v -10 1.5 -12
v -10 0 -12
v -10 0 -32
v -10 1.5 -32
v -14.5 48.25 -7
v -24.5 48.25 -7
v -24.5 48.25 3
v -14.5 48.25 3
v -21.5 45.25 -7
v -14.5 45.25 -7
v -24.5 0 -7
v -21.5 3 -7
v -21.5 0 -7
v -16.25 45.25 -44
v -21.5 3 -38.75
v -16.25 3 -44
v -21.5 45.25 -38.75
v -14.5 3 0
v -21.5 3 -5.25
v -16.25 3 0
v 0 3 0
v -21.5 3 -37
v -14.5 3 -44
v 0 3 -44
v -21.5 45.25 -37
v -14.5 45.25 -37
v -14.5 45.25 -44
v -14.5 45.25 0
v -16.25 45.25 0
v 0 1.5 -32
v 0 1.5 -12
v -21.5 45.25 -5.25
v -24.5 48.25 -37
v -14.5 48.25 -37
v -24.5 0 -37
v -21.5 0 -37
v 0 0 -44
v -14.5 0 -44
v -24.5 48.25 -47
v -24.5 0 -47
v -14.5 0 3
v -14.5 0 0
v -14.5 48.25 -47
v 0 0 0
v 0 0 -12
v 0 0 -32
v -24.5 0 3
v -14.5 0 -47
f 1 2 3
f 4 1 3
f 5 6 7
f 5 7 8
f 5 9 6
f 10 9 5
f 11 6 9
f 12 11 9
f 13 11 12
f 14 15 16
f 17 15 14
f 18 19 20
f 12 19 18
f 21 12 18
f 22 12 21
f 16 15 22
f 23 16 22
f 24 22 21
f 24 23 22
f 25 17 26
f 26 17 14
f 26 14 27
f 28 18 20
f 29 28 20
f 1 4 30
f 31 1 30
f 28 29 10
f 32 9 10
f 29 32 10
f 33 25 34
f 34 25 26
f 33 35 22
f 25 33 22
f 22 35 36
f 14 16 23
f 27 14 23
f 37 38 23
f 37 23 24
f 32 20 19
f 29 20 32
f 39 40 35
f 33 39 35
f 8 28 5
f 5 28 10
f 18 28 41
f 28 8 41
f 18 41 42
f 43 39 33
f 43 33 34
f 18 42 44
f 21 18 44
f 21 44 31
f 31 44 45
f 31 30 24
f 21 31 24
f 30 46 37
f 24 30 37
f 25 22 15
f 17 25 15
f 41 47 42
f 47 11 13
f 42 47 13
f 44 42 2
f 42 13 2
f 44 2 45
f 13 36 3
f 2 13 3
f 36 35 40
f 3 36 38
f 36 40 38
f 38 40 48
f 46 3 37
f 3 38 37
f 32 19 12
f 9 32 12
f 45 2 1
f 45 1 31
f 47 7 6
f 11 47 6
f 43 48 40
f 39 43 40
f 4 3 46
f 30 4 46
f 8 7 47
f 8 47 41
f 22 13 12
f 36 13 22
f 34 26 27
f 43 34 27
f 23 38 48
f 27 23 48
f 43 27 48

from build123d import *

# Parameters (mm, degrees)
SKETCH1_W           = 21.5
SKETCH1_H           = 44
BOSS_EXTRUDE2_DEPTH = 3
SKETCH1_8_W         = 10
SKETCH1_8_H         = 20
CUT_EXTRUDE1_DEPTH  = 1.5
BOSS_EXTRUDE3_DEPTH = 45.25
SKETCH2_W           = 10
SKETCH2_H           = 10
BOSS_EXTRUDE4_DEPTH = 3
CHAMFER4_SIZE       = 5.25


with BuildPart() as part:
    # Sketch1 → Boss-Extrude2 (new body)
    with BuildSketch(Plane(origin=(0, 0, 0), x_dir=(1, 0, 0), z_dir=(0, 1, 0))):
        with Locations((-10.75, 22)):
            Rectangle(SKETCH1_W, SKETCH1_H)
    extrude(amount=BOSS_EXTRUDE2_DEPTH)

    # Sketch1<8> → Cut-Extrude1 (cut)
    with BuildSketch(Plane(origin=(0, 0, 0), x_dir=(1, 0, 0), z_dir=(0, 1, 0))):
        with Locations((-5, 22)):
            Rectangle(SKETCH1_8_W, SKETCH1_8_H)
    extrude(amount=CUT_EXTRUDE1_DEPTH, mode=Mode.SUBTRACT)

    # Sketch1<9> → Boss-Extrude3 (add)
    with BuildSketch(Plane(origin=(0, 0, 0), x_dir=(1, 0, 0), z_dir=(0, 1, 0))):
        Polygon((-21.5, 0), (-21.5, 7), (-24.5, 7), (-24.5, -3), (-14.5, -3), (-14.5, 0), align=None)
        Polygon((-24.5, 37), (-21.5, 37), (-21.5, 44), (-14.5, 44), (-14.5, 47), (-24.5, 47), align=None)
    extrude(amount=BOSS_EXTRUDE3_DEPTH)

    # Sketch2 → Boss-Extrude4 (add)
    with BuildSketch(Plane(origin=(0, 45.25, 0), x_dir=(1, 0, 0), z_dir=(0, 1, 0))):
        with Locations((-19.5, 2)):
            Rectangle(SKETCH2_W, SKETCH2_H)
        with Locations((-19.5, 42)):
            Rectangle(SKETCH2_W, SKETCH2_H)
    extrude(amount=BOSS_EXTRUDE4_DEPTH)

    # Chamfer4
    chamfer4_edges = [part.edges().sort_by_distance(p)[0] for p in [
        (-21.5, 24.125, 0),
        (-21.5, 24.125, -44),
    ]]
    chamfer(chamfer4_edges, length=CHAMFER4_SIZE)


solid = part.part
